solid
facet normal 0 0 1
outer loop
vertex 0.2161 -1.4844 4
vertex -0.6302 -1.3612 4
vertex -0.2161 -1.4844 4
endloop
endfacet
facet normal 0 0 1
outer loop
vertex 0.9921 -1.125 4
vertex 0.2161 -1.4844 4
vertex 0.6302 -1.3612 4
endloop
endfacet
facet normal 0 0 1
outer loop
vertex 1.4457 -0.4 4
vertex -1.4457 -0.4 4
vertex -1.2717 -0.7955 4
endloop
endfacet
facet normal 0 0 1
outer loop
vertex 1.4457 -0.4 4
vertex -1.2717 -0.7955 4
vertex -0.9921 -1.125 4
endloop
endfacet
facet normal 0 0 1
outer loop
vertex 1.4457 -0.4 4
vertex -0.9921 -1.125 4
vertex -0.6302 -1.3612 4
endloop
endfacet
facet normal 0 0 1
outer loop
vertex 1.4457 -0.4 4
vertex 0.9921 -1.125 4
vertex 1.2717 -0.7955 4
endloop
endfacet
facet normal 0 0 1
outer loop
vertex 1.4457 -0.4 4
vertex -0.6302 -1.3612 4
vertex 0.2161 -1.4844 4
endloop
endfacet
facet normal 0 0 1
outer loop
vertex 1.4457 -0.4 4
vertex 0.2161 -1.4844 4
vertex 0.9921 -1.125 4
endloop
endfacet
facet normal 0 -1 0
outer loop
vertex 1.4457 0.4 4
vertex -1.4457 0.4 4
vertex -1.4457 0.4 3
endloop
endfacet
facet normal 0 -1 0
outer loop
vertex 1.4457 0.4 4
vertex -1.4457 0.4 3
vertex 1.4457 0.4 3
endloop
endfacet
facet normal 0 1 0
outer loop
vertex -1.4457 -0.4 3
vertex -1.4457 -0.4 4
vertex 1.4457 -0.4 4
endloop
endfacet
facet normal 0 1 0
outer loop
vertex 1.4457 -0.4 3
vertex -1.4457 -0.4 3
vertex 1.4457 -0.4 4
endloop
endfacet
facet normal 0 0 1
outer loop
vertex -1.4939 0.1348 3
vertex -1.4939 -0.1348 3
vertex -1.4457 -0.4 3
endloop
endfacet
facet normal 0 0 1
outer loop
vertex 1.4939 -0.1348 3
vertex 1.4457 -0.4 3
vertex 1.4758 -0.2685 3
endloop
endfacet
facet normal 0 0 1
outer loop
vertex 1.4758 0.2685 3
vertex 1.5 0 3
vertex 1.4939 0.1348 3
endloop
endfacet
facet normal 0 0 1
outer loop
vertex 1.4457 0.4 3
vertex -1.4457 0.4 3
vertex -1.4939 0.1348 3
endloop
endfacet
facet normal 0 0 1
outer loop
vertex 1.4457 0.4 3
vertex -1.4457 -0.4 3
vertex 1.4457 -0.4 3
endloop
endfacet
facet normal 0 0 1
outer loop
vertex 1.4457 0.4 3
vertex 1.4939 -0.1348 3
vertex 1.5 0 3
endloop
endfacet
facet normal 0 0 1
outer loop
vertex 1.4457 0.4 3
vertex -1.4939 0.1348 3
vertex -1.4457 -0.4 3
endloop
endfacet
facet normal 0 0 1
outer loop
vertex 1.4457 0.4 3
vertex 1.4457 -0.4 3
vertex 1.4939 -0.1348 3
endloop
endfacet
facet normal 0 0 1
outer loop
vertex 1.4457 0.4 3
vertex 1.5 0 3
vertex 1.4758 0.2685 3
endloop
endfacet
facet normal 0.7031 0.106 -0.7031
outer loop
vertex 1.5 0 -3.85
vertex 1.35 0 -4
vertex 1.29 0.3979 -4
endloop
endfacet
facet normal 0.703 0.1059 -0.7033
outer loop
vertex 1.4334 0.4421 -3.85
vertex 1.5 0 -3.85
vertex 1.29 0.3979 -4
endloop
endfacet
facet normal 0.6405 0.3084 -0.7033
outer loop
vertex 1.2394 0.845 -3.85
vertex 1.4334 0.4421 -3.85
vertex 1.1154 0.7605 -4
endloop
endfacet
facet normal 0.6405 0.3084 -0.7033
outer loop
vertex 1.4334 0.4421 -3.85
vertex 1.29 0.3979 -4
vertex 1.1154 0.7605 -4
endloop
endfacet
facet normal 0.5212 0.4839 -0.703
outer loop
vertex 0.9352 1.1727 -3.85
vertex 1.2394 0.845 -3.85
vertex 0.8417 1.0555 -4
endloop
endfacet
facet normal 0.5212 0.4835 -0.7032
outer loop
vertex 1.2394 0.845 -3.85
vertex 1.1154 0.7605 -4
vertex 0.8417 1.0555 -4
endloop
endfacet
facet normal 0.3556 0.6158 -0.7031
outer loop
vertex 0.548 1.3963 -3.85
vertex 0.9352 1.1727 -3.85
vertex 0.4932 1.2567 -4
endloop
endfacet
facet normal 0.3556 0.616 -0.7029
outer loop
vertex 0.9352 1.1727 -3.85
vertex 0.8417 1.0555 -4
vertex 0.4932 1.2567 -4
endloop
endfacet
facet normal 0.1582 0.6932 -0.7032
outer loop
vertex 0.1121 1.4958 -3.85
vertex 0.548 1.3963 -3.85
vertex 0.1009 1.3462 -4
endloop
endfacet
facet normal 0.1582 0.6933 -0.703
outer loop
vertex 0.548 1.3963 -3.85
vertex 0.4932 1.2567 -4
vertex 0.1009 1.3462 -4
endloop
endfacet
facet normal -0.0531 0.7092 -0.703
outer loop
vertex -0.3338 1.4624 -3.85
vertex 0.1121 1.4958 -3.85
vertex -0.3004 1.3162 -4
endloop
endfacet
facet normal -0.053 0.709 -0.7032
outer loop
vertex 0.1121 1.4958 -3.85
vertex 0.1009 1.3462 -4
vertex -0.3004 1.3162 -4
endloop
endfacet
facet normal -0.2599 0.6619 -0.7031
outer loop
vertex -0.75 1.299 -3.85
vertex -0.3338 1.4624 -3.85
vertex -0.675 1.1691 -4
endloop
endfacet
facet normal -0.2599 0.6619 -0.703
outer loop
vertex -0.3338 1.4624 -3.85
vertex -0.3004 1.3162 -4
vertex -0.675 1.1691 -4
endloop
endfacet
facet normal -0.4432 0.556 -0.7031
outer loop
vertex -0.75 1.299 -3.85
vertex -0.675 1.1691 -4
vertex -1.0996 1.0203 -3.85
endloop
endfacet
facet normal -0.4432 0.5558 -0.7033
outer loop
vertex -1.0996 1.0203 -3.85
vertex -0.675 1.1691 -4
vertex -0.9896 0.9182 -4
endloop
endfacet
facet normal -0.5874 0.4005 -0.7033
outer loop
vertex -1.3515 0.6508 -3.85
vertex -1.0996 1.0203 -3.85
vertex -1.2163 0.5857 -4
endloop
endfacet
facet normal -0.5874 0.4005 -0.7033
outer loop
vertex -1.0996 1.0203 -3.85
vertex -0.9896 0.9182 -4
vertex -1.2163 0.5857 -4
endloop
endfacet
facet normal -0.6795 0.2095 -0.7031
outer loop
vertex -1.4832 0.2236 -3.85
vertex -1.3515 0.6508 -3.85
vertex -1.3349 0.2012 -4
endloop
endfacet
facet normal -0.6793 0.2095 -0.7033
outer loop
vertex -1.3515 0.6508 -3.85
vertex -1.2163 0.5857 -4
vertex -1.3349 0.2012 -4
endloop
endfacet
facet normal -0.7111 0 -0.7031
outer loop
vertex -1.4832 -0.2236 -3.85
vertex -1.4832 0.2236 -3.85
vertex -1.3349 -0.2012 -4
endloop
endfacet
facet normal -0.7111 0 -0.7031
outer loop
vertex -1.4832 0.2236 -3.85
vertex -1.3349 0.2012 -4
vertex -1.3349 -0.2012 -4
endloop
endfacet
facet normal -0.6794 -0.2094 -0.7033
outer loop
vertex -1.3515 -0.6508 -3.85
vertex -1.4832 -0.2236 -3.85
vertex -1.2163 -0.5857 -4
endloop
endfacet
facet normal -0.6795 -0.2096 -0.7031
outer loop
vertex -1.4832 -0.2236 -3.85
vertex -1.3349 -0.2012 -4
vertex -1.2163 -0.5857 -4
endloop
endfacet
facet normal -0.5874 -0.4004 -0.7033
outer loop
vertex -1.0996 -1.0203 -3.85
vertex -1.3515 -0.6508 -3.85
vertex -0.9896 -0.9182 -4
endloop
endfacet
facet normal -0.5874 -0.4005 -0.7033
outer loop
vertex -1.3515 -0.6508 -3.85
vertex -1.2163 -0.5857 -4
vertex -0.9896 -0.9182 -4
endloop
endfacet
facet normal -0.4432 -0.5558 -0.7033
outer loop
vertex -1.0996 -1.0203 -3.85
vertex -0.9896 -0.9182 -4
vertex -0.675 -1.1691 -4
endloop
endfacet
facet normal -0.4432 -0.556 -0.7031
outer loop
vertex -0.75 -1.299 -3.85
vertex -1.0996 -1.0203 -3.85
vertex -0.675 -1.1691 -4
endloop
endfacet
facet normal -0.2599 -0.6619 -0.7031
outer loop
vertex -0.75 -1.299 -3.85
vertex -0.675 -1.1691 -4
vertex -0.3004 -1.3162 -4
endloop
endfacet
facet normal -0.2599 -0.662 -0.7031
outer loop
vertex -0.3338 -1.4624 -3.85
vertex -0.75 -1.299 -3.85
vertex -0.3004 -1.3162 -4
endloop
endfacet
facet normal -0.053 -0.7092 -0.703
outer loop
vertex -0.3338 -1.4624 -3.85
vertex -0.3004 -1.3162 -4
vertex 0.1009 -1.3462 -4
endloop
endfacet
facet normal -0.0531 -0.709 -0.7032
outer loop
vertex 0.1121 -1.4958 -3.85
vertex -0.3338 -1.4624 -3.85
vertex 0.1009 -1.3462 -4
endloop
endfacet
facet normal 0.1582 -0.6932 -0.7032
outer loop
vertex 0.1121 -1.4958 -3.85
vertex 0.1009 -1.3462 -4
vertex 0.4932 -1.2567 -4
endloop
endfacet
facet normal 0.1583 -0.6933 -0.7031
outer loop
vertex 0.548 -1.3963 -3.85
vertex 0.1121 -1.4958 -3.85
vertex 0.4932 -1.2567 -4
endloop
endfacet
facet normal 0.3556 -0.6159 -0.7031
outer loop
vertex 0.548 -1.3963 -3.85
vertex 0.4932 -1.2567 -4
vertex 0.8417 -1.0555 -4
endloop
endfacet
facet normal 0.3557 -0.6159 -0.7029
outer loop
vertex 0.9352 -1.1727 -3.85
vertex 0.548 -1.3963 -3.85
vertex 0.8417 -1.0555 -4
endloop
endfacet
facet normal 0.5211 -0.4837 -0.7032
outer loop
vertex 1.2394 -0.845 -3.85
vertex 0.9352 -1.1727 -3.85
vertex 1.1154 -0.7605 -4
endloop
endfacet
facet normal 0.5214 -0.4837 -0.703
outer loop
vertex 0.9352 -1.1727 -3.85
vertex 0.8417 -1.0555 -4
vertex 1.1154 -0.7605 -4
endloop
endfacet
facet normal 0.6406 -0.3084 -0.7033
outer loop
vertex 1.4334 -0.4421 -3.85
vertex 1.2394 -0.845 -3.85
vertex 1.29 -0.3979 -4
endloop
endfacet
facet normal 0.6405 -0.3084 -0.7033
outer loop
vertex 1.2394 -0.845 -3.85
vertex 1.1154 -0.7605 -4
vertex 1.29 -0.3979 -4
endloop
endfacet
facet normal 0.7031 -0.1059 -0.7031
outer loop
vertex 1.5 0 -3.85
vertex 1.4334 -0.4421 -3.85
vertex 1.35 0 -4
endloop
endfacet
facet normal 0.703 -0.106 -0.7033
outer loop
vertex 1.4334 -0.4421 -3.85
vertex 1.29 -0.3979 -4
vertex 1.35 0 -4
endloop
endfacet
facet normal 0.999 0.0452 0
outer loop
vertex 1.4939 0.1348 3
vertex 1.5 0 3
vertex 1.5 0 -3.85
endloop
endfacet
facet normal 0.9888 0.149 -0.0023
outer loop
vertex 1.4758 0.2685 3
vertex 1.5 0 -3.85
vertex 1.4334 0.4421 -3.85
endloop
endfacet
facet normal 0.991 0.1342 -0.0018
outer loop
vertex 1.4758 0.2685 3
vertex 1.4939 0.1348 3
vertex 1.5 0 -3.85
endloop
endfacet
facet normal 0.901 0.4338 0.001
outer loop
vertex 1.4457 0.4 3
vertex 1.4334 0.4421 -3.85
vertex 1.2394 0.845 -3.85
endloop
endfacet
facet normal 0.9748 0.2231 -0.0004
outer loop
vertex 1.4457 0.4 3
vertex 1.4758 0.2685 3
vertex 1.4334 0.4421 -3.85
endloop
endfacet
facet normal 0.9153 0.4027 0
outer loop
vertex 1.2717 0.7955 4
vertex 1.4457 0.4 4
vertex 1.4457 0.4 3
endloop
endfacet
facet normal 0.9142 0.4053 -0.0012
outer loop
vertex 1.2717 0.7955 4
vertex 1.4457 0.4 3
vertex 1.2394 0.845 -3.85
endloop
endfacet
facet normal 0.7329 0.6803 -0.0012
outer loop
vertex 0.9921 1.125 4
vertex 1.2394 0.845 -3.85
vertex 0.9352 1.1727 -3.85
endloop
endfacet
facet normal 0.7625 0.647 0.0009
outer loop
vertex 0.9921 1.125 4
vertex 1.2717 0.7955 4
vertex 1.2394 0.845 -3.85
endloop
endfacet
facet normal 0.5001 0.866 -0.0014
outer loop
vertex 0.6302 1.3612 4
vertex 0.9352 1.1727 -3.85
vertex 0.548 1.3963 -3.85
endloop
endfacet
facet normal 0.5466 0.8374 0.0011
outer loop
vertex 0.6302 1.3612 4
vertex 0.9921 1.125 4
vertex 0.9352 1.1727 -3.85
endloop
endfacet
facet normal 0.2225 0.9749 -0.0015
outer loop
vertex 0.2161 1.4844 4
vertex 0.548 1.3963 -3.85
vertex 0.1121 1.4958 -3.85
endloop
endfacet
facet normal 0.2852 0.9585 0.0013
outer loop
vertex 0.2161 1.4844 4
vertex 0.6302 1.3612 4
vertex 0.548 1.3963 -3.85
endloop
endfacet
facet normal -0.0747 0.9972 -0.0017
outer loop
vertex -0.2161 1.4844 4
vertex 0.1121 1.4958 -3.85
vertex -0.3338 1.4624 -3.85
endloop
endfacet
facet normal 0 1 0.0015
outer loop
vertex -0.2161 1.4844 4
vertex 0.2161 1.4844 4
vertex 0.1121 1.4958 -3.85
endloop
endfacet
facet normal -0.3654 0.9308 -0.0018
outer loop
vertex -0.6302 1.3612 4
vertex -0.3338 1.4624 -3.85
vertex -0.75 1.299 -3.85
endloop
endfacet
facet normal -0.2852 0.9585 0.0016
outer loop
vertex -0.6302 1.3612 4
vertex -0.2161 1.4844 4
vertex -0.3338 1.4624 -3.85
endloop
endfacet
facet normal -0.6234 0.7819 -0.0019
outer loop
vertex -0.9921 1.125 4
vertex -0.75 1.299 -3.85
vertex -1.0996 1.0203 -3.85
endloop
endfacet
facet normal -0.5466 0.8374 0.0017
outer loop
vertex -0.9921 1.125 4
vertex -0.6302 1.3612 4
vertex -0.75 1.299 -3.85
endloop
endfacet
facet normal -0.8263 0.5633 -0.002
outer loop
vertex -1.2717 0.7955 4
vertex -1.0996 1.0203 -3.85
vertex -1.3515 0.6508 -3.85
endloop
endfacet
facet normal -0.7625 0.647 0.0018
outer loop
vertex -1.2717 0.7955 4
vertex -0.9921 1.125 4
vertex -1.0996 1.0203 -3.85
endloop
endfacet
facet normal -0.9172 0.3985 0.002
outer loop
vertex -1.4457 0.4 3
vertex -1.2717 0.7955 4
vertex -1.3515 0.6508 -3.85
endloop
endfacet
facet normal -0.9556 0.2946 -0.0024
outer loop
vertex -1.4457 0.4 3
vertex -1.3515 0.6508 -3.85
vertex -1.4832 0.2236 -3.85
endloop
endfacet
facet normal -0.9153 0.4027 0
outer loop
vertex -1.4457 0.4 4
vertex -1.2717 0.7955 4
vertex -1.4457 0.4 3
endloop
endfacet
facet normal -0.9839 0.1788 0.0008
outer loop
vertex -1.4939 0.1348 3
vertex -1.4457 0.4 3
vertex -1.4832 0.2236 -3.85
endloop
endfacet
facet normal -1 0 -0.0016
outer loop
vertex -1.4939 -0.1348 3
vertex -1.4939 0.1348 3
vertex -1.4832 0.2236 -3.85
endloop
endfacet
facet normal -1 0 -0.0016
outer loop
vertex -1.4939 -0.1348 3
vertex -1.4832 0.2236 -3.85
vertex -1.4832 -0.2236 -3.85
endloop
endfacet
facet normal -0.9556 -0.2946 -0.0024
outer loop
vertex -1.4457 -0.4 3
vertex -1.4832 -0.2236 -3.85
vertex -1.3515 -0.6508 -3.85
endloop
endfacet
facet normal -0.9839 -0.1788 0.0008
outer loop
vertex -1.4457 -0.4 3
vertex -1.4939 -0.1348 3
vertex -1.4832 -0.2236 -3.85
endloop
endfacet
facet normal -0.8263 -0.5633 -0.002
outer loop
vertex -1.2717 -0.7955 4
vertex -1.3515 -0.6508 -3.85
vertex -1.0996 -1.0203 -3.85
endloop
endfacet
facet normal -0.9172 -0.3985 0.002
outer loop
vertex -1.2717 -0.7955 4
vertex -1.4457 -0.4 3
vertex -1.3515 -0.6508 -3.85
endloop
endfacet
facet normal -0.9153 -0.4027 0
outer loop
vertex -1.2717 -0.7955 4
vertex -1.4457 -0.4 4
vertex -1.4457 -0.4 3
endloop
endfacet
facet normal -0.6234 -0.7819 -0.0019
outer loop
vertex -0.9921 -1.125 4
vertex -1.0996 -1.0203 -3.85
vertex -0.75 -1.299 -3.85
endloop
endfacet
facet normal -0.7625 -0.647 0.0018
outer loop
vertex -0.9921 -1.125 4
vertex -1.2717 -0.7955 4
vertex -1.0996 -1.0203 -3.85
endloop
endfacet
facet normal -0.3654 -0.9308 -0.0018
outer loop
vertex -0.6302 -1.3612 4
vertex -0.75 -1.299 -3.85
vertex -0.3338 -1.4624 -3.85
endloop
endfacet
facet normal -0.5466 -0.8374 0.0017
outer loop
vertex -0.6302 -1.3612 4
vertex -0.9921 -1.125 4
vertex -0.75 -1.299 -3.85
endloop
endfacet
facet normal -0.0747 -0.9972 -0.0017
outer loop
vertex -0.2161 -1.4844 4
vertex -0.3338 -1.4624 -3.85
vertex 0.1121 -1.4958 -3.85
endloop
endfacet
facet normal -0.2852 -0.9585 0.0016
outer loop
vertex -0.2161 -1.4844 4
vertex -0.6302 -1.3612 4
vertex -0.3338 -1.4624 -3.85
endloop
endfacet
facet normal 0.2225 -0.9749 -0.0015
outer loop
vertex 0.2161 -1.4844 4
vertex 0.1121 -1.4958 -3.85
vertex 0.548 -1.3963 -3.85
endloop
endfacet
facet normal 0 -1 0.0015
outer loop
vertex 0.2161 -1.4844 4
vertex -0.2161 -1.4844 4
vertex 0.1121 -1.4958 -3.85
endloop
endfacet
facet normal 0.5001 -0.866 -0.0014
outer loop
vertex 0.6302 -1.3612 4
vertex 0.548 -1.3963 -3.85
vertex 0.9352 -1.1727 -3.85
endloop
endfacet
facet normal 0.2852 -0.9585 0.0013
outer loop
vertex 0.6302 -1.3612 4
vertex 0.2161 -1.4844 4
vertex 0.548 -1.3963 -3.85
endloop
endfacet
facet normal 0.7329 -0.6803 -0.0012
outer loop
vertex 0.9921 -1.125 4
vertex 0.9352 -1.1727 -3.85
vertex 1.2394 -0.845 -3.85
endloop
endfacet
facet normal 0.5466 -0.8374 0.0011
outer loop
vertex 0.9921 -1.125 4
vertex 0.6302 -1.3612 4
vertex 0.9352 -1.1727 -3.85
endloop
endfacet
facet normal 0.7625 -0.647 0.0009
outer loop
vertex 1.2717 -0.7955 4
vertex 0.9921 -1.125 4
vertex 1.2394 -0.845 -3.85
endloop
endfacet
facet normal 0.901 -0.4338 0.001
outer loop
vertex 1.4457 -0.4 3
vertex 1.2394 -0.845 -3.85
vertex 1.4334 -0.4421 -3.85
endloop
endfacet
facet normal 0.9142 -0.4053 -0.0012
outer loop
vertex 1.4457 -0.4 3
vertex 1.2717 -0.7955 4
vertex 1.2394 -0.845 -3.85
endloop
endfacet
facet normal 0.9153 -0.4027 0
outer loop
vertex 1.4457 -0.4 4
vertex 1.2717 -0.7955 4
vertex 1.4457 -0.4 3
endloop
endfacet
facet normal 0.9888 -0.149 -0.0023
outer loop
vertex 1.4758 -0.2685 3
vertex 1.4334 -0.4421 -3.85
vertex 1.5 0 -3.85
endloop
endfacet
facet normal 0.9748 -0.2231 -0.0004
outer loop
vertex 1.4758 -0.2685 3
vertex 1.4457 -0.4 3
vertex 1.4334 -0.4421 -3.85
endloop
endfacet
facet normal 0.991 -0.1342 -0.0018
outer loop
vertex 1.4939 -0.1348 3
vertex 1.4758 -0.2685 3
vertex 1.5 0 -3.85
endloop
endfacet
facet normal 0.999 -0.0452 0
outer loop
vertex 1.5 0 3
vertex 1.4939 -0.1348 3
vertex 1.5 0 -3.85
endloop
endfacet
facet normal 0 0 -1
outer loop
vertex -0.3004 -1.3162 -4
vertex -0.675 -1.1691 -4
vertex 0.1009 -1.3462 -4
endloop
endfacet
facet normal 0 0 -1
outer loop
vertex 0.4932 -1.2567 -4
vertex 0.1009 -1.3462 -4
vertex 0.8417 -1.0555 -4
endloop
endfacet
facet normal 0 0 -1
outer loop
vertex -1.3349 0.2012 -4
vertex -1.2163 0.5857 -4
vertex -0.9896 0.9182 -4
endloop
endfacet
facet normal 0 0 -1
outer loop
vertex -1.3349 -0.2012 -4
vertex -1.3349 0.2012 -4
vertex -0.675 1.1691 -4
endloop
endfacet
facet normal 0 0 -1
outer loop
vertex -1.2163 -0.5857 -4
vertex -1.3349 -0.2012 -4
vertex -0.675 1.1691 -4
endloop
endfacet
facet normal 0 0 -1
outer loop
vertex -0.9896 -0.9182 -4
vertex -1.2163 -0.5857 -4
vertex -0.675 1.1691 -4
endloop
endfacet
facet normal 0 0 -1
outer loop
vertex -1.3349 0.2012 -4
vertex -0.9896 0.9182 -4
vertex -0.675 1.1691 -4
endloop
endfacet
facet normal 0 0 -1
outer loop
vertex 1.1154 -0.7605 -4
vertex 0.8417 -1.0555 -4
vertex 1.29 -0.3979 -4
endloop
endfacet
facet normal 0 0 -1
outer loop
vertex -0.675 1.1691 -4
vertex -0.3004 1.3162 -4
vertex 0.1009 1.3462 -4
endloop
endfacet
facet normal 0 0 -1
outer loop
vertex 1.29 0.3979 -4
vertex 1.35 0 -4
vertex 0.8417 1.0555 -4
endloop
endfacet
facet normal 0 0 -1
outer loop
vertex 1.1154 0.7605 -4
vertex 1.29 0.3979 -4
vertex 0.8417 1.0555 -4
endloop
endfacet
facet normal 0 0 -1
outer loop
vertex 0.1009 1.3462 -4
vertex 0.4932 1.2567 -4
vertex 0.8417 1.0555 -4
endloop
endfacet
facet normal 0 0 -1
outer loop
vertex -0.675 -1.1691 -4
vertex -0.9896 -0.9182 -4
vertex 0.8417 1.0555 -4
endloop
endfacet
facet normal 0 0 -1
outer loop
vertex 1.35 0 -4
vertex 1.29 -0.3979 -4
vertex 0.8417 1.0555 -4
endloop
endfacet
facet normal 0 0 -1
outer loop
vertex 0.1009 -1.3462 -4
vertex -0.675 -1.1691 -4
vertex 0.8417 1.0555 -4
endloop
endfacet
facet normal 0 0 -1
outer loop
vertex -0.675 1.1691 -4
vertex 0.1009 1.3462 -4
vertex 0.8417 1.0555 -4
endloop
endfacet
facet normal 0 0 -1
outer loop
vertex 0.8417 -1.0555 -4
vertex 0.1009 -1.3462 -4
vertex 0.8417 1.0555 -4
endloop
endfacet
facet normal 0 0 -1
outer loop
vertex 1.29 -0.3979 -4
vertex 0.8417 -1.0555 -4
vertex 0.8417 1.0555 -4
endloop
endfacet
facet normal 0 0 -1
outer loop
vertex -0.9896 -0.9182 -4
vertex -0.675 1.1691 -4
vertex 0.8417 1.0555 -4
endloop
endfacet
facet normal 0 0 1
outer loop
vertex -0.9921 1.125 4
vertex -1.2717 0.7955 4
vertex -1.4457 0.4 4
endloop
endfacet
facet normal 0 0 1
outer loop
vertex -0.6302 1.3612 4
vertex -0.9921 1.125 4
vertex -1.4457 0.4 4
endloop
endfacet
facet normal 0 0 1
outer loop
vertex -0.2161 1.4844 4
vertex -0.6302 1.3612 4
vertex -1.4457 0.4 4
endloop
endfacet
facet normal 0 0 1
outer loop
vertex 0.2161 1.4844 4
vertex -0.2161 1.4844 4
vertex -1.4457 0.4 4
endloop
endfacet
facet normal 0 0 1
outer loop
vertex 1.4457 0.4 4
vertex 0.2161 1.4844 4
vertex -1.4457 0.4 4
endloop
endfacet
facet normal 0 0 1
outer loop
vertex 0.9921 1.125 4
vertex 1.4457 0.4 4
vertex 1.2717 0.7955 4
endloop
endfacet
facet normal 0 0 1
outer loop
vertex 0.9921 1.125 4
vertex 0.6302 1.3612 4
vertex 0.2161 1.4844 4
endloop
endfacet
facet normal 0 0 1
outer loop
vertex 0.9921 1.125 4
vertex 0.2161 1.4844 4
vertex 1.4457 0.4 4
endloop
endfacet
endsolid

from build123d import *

# Parameters (mm, degrees)
SKETCH1_R           = 1.5
BOSS_EXTRUDE1_DEPTH = 4
CHAMFER1_SIZE       = 0.15
SKETCH3_W           = 3
SKETCH3_H           = 0.8
CUT_EXTRUDE1_DEPTH  = 1


with BuildPart() as part:
    # Sketch1 → Boss-Extrude1 (new, symmetric)
    with BuildSketch(Plane.XY):
        Circle(SKETCH1_R)
    extrude(amount=BOSS_EXTRUDE1_DEPTH, both=True)

    # Chamfer1
    chamfer1_edges = [part.edges().sort_by_distance(p)[0] for p in [
        (-1.5, 0, -4),
    ]]
    chamfer(chamfer1_edges, length=CHAMFER1_SIZE)

    # Sketch3 → Cut-Extrude1 (cut)
    with BuildSketch(Plane.XY.offset(4)):
        Rectangle(SKETCH3_W, SKETCH3_H)
    extrude(amount=-CUT_EXTRUDE1_DEPTH, mode=Mode.SUBTRACT)


solid = part.part
